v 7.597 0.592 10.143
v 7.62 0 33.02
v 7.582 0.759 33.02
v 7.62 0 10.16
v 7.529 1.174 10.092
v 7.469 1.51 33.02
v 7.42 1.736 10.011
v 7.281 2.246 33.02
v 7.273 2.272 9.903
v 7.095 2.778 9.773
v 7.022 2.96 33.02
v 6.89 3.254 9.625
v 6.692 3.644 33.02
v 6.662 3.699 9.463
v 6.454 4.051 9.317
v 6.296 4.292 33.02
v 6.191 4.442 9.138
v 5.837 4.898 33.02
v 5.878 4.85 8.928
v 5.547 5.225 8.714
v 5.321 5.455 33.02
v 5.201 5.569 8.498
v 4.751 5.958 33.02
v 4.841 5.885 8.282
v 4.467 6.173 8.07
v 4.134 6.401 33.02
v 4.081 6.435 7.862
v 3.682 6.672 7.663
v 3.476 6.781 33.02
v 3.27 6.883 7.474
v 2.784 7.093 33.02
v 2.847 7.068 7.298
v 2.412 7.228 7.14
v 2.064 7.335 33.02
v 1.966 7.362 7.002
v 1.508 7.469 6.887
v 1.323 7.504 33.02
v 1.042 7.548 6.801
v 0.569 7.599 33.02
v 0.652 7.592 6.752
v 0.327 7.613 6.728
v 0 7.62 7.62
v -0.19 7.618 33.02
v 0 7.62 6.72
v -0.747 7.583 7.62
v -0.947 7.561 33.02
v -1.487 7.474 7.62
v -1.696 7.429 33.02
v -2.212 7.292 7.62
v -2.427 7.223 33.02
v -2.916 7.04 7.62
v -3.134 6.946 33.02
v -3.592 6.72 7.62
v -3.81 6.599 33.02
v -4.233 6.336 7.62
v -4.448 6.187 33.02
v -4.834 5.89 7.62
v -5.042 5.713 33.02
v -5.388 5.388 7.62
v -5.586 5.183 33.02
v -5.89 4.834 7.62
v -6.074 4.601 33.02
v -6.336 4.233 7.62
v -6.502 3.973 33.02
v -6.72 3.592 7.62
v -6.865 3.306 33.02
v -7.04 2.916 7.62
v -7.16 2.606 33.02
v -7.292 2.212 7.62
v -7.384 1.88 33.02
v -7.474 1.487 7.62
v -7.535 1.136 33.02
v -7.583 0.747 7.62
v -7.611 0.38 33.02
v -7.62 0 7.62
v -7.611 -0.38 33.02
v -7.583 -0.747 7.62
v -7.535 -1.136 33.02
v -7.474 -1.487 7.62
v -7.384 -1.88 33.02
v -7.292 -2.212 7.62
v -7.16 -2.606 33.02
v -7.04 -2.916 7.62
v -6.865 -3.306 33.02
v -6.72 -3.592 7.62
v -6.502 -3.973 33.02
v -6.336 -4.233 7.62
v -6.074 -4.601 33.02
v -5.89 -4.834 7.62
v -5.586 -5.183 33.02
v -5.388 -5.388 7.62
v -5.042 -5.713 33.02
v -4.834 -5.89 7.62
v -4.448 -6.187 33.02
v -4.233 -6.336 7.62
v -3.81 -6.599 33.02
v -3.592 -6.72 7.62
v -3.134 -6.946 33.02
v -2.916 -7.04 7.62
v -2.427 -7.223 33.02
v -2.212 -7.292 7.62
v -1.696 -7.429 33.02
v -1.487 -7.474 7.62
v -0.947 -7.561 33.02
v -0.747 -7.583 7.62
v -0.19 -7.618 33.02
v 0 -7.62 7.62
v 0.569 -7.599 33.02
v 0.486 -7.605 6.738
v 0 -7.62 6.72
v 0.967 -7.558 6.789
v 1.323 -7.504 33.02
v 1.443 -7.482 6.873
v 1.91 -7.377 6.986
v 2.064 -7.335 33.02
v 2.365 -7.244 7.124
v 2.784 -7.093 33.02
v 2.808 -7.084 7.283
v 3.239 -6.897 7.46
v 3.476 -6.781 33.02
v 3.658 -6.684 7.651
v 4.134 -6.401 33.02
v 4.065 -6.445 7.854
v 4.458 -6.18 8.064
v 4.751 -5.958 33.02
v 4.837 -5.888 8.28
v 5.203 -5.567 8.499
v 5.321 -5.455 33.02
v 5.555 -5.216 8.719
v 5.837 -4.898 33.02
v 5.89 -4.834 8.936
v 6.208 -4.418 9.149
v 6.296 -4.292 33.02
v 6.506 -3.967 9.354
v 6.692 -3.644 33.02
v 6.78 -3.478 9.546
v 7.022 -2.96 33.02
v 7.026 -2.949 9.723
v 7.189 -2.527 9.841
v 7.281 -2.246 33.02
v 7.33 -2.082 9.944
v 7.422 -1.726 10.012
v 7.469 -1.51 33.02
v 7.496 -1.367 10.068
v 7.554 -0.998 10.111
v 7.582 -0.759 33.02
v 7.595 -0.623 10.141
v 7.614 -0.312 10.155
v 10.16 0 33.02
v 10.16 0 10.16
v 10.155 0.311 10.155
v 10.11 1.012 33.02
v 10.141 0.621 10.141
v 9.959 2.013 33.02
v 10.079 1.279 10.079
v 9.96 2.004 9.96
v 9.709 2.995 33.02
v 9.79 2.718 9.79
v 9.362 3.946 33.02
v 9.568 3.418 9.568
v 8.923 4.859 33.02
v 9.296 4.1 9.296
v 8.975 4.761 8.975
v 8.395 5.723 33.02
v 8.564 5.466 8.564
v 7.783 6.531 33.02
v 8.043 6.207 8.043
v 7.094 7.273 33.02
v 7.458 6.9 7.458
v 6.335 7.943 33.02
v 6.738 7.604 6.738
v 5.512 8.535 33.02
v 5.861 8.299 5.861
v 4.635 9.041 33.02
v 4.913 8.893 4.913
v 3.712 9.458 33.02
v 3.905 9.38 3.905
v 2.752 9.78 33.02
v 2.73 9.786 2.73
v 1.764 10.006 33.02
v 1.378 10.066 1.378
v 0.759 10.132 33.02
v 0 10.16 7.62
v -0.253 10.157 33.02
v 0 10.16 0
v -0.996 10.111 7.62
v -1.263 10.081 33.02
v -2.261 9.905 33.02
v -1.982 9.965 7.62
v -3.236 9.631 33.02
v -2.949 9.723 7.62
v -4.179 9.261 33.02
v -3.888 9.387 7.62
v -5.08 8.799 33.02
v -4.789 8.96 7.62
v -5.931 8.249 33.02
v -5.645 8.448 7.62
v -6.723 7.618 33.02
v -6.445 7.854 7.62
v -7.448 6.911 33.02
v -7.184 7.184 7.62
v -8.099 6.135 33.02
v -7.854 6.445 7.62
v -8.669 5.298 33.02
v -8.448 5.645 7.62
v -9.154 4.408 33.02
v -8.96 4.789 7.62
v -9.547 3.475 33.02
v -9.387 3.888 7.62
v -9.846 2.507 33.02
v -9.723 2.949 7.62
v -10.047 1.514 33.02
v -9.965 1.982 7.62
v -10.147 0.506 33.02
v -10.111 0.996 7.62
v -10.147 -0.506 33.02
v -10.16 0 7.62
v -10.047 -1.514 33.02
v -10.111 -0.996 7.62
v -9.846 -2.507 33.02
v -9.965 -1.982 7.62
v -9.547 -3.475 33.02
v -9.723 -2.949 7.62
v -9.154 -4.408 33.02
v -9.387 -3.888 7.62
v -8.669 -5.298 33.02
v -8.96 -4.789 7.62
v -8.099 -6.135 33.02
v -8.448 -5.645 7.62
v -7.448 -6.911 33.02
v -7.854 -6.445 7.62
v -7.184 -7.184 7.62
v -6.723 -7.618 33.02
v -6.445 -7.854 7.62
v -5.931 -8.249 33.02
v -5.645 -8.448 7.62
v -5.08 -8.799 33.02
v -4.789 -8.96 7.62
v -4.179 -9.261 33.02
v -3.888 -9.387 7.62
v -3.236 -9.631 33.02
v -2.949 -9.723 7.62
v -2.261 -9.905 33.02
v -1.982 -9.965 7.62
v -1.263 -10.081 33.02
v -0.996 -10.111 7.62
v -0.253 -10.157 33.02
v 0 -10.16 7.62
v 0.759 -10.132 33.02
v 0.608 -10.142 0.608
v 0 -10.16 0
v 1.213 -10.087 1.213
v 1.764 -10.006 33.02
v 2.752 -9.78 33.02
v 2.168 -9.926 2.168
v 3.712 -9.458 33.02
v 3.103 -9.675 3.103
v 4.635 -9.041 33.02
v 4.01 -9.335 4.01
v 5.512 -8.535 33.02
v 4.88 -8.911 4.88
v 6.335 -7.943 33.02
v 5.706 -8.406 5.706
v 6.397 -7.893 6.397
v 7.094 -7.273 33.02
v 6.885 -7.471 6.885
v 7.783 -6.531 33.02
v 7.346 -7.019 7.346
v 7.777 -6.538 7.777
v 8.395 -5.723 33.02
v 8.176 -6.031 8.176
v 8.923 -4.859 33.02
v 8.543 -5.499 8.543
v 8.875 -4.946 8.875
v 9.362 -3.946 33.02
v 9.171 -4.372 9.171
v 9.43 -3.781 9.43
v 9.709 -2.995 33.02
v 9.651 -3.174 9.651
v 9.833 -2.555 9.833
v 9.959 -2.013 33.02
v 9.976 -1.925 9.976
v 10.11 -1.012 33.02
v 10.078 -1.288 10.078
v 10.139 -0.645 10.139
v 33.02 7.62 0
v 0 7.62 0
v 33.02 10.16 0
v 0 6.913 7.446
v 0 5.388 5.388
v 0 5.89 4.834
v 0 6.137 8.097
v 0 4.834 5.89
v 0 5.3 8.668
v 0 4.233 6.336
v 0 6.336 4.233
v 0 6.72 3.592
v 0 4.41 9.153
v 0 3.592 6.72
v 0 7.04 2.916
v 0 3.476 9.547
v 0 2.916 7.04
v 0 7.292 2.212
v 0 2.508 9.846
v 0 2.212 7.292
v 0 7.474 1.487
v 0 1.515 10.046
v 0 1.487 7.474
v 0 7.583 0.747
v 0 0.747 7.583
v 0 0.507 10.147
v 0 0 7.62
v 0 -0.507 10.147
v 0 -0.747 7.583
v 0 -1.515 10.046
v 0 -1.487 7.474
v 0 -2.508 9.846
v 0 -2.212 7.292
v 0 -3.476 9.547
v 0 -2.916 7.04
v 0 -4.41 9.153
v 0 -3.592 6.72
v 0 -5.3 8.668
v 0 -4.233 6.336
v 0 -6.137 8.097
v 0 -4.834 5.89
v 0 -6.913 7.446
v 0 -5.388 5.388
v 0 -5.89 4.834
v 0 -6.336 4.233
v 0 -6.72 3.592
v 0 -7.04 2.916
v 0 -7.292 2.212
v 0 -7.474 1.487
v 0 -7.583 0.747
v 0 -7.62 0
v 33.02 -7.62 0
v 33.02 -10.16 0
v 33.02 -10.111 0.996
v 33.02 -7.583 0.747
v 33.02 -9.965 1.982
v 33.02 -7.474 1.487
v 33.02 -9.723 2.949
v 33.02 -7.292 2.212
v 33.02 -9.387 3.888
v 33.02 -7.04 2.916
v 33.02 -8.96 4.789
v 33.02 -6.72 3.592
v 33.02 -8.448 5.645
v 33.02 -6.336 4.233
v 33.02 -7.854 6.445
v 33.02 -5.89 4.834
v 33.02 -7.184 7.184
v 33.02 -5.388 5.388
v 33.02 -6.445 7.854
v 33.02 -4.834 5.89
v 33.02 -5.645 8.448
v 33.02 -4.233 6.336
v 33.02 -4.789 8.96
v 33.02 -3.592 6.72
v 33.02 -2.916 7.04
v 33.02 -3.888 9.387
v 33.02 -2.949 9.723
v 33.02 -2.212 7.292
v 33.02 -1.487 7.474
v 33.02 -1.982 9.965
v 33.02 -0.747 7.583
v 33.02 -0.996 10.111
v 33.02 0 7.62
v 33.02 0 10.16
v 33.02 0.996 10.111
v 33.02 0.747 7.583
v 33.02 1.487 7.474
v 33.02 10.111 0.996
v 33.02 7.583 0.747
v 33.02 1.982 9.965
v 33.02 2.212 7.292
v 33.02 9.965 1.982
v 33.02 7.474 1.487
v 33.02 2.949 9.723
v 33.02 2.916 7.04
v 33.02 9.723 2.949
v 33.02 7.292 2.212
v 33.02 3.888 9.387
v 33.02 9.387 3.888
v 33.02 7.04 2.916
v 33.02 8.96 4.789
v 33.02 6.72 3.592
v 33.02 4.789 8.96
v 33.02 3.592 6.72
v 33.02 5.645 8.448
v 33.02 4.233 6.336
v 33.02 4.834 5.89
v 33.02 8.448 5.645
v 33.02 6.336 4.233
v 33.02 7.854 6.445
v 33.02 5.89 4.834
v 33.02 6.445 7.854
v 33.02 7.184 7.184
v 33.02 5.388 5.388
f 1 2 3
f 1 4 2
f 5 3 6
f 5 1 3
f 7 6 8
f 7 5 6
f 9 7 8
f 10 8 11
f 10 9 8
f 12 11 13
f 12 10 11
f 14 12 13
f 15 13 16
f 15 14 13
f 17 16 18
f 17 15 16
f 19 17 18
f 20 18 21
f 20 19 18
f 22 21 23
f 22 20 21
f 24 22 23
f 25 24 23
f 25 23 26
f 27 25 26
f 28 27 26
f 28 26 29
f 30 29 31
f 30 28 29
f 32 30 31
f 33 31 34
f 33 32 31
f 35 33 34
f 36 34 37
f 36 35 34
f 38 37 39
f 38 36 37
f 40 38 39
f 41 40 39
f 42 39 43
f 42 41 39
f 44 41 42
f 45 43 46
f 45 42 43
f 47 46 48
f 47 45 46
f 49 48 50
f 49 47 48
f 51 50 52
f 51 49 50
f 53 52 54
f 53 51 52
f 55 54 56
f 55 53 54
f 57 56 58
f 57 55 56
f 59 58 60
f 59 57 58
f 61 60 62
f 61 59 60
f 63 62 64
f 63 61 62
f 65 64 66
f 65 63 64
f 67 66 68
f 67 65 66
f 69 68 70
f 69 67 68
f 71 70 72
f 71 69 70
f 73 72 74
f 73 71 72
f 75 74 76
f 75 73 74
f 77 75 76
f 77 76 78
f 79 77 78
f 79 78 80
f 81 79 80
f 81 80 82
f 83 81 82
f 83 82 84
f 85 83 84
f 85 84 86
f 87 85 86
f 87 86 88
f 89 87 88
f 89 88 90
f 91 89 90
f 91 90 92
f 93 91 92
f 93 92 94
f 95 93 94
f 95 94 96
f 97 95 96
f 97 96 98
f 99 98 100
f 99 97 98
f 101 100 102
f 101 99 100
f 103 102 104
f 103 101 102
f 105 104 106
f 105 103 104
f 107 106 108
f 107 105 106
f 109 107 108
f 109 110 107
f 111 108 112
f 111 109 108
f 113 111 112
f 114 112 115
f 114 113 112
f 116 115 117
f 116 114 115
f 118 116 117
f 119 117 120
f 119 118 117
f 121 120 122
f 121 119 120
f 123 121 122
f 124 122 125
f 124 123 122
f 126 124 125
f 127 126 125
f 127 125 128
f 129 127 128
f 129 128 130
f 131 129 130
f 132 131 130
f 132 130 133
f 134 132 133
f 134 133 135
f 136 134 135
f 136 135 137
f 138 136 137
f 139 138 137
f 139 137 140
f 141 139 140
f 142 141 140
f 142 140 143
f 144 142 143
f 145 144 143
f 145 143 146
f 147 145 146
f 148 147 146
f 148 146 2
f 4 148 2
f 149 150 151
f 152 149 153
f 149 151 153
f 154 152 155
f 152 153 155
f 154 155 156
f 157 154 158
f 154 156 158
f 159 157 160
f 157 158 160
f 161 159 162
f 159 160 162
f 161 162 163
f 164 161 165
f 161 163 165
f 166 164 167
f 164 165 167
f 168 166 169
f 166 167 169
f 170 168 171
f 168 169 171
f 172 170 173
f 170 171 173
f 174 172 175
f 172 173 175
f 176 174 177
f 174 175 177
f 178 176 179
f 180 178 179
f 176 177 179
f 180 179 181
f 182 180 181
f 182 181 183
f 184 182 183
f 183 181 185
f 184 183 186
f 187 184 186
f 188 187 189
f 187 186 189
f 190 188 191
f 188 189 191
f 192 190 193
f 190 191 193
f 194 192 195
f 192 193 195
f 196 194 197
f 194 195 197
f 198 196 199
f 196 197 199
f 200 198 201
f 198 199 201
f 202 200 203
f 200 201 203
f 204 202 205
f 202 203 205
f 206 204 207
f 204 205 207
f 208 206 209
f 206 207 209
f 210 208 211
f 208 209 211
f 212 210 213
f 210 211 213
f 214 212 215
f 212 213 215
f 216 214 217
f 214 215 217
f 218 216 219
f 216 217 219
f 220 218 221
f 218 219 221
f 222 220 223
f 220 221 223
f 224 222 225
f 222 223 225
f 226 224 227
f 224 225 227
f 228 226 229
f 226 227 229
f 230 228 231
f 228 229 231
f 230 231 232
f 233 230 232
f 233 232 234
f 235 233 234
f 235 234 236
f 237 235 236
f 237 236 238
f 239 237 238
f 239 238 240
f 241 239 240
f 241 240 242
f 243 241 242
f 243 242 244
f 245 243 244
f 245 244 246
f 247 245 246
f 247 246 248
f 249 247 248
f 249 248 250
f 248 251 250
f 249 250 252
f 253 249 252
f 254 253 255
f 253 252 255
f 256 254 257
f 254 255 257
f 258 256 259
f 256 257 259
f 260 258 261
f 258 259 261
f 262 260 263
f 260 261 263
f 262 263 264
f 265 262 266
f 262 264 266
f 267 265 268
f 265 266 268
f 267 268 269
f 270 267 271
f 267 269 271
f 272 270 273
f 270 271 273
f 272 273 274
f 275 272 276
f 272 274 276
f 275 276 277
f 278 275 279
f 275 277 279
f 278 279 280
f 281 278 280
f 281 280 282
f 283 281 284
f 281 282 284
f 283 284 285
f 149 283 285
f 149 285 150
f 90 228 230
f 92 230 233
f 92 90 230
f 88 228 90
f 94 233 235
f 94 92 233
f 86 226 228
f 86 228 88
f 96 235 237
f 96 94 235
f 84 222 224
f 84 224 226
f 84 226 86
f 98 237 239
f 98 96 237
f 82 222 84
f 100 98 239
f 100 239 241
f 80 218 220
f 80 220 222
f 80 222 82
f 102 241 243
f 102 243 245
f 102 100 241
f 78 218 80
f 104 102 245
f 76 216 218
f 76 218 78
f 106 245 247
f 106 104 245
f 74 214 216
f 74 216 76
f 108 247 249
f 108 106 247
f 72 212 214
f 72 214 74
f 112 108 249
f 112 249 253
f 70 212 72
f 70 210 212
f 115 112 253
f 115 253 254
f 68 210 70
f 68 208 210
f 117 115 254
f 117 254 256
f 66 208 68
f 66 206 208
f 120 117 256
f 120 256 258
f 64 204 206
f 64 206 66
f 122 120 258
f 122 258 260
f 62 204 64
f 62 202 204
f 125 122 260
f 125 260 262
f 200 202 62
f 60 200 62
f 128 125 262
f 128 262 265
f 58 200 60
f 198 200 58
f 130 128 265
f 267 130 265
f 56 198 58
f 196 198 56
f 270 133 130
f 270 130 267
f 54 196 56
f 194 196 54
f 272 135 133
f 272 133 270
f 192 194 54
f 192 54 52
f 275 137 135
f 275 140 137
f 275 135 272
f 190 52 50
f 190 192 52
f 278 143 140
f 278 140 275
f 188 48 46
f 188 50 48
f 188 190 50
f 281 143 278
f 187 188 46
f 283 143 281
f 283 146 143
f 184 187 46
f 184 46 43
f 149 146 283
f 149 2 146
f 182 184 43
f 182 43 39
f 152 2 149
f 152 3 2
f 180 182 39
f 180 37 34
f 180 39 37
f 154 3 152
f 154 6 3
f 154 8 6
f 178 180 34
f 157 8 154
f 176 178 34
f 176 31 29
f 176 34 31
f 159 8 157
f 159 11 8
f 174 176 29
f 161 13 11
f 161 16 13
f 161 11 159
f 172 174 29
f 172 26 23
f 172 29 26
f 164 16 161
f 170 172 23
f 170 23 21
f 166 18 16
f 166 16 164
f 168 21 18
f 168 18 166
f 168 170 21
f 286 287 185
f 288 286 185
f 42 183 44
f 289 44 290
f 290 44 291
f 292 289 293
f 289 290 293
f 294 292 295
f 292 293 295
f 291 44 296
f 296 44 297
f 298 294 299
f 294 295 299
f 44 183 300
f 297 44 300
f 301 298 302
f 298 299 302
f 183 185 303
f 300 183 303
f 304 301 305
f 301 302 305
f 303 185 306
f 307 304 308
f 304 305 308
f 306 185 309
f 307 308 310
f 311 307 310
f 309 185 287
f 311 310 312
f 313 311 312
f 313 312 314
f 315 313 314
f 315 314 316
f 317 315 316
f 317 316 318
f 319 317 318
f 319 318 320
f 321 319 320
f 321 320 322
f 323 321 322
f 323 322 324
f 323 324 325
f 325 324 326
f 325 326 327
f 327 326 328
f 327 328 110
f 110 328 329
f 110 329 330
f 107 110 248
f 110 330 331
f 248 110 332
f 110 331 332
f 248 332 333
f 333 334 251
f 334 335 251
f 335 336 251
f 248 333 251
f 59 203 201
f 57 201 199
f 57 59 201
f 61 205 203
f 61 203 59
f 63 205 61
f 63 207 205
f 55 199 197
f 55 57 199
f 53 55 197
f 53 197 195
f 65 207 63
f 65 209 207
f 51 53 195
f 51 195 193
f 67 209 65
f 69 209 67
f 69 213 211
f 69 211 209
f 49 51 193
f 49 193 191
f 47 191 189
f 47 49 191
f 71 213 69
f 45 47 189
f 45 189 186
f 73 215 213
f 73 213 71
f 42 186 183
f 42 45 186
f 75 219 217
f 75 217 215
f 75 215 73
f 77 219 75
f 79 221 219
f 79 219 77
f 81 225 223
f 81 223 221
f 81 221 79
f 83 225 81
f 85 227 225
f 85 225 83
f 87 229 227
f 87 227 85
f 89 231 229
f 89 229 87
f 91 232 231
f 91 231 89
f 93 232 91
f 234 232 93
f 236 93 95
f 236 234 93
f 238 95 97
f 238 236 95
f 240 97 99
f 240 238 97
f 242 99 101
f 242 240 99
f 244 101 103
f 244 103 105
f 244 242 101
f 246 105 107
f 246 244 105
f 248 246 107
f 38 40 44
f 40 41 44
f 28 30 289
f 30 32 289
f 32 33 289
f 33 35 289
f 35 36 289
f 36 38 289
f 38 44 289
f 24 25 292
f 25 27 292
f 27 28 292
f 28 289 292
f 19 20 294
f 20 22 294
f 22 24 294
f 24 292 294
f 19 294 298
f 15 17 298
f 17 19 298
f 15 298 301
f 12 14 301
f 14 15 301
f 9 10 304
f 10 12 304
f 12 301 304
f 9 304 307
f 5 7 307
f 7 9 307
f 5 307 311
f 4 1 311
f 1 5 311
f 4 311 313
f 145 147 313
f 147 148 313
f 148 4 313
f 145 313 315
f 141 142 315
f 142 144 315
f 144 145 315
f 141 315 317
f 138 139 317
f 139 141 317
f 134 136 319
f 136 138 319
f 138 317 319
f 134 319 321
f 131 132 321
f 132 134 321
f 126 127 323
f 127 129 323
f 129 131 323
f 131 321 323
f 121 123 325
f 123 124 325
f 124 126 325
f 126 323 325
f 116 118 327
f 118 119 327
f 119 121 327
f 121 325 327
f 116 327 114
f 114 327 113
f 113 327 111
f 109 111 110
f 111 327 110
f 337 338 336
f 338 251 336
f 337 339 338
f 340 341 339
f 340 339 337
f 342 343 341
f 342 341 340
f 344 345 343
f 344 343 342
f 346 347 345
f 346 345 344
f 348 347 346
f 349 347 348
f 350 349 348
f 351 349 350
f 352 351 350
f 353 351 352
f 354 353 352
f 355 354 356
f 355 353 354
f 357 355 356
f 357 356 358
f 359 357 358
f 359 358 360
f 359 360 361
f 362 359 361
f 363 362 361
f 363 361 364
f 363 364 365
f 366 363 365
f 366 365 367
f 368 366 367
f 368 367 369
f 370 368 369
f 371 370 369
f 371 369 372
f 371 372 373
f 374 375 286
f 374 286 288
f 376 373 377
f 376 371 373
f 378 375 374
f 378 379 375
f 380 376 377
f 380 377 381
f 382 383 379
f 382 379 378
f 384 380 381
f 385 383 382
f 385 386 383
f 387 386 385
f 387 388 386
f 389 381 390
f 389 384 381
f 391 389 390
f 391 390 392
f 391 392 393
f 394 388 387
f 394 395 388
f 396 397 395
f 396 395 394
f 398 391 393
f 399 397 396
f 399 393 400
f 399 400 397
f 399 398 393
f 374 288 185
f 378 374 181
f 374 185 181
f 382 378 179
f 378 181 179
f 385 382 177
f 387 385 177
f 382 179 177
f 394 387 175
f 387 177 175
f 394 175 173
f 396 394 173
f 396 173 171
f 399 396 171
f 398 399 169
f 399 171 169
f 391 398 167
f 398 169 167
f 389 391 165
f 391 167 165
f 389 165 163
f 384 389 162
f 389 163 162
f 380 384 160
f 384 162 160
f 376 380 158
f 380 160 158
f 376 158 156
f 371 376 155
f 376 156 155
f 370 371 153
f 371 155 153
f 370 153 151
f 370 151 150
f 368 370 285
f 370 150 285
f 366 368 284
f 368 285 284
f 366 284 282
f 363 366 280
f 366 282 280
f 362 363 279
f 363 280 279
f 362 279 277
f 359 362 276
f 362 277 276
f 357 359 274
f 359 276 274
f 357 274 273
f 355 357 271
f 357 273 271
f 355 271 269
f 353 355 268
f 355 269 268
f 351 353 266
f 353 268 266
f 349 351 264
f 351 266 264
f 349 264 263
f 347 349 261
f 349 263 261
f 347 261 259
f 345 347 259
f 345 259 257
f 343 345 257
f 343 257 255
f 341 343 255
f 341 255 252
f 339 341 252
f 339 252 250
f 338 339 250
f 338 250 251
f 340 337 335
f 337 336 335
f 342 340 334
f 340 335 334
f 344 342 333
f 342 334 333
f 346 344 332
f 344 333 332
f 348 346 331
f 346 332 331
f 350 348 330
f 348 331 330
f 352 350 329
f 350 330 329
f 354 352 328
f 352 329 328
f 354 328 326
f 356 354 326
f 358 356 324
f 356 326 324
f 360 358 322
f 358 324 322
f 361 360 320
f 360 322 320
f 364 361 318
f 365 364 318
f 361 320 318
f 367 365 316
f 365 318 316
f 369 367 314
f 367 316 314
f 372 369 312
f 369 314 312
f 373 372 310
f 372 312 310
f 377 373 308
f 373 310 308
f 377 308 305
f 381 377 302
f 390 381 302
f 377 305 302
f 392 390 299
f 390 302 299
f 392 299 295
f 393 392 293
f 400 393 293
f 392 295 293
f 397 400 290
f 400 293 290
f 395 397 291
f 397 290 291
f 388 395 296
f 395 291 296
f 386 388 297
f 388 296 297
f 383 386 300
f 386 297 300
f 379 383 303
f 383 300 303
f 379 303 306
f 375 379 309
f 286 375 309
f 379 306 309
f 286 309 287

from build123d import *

# Parameters (mm, degrees)
F0_R     = 10.16
F0_R_2   = 7.62
F1_DEPTH = 25.4
F3_DEPTH = 25.4
F5_DEPTH = 46.736
F7_DEPTH = 7.62
F8_DEPTH = 7.62
F9_DEPTH = 7.62


with BuildPart() as f1:
    # F0 (on Top) → F1 (new body)
    with BuildSketch(Plane.XY):
        Circle(F0_R)
        Circle(F0_R_2, mode=Mode.SUBTRACT)
    extrude(amount=F1_DEPTH)

    # F2 (on Right) → F3 (join)
    with BuildSketch(Plane.YZ):
        with BuildLine():
            Line((-10.16, 0), (-7.5868873905, 0))
            ThreePointArc((-7.5868873905, 0), (0, 7.5868873905), (7.5868873905, 0))
            Line((7.5868873905, 0), (10.16, 0))
            ThreePointArc((10.16, 0), (0, 10.16), (-10.16, 0))
        make_face()
    extrude(amount=F3_DEPTH)

    # F4 (on Right) → F5 (cut)
    with BuildSketch(Plane.YZ):
        with BuildLine():
            ThreePointArc((7.62, 0), (0, 7.62), (-7.62, 0))
            Line((-7.62, 0), (7.62, 0))
        make_face()
    extrude(amount=F5_DEPTH, mode=Mode.SUBTRACT)

    # F6 (on face) → F7 (cut)
    with BuildSketch(Plane(origin=(0, 0, 0), x_dir=(1, 0, 0), z_dir=(0, 0, -1))):
        with BuildLine():
            Line((0, 7.62), (0, 10.16))
            ThreePointArc((0, 10.16), (-10.16, 0), (0, -10.16))
            Line((0, -10.16), (0, -7.62))
            ThreePointArc((0, -7.62), (-7.62, 0), (0, 7.62))
        make_face()
    extrude(amount=-F7_DEPTH, mode=Mode.SUBTRACT)

    # F8 (add): a face of the model
    f8_faces = [f1.faces().sort_by_distance(p)[0] for p in [
        (-9.8726318041, 0, 25.4),
    ]]
    extrude(f8_faces, amount=F8_DEPTH)

    # F9 (add): a face of the model
    f9_faces = [f1.faces().sort_by_distance(p)[0] for p in [
        (25.4, 0, 7.8471845065),
    ]]
    extrude(f9_faces, amount=F9_DEPTH)


solid = f1.part
